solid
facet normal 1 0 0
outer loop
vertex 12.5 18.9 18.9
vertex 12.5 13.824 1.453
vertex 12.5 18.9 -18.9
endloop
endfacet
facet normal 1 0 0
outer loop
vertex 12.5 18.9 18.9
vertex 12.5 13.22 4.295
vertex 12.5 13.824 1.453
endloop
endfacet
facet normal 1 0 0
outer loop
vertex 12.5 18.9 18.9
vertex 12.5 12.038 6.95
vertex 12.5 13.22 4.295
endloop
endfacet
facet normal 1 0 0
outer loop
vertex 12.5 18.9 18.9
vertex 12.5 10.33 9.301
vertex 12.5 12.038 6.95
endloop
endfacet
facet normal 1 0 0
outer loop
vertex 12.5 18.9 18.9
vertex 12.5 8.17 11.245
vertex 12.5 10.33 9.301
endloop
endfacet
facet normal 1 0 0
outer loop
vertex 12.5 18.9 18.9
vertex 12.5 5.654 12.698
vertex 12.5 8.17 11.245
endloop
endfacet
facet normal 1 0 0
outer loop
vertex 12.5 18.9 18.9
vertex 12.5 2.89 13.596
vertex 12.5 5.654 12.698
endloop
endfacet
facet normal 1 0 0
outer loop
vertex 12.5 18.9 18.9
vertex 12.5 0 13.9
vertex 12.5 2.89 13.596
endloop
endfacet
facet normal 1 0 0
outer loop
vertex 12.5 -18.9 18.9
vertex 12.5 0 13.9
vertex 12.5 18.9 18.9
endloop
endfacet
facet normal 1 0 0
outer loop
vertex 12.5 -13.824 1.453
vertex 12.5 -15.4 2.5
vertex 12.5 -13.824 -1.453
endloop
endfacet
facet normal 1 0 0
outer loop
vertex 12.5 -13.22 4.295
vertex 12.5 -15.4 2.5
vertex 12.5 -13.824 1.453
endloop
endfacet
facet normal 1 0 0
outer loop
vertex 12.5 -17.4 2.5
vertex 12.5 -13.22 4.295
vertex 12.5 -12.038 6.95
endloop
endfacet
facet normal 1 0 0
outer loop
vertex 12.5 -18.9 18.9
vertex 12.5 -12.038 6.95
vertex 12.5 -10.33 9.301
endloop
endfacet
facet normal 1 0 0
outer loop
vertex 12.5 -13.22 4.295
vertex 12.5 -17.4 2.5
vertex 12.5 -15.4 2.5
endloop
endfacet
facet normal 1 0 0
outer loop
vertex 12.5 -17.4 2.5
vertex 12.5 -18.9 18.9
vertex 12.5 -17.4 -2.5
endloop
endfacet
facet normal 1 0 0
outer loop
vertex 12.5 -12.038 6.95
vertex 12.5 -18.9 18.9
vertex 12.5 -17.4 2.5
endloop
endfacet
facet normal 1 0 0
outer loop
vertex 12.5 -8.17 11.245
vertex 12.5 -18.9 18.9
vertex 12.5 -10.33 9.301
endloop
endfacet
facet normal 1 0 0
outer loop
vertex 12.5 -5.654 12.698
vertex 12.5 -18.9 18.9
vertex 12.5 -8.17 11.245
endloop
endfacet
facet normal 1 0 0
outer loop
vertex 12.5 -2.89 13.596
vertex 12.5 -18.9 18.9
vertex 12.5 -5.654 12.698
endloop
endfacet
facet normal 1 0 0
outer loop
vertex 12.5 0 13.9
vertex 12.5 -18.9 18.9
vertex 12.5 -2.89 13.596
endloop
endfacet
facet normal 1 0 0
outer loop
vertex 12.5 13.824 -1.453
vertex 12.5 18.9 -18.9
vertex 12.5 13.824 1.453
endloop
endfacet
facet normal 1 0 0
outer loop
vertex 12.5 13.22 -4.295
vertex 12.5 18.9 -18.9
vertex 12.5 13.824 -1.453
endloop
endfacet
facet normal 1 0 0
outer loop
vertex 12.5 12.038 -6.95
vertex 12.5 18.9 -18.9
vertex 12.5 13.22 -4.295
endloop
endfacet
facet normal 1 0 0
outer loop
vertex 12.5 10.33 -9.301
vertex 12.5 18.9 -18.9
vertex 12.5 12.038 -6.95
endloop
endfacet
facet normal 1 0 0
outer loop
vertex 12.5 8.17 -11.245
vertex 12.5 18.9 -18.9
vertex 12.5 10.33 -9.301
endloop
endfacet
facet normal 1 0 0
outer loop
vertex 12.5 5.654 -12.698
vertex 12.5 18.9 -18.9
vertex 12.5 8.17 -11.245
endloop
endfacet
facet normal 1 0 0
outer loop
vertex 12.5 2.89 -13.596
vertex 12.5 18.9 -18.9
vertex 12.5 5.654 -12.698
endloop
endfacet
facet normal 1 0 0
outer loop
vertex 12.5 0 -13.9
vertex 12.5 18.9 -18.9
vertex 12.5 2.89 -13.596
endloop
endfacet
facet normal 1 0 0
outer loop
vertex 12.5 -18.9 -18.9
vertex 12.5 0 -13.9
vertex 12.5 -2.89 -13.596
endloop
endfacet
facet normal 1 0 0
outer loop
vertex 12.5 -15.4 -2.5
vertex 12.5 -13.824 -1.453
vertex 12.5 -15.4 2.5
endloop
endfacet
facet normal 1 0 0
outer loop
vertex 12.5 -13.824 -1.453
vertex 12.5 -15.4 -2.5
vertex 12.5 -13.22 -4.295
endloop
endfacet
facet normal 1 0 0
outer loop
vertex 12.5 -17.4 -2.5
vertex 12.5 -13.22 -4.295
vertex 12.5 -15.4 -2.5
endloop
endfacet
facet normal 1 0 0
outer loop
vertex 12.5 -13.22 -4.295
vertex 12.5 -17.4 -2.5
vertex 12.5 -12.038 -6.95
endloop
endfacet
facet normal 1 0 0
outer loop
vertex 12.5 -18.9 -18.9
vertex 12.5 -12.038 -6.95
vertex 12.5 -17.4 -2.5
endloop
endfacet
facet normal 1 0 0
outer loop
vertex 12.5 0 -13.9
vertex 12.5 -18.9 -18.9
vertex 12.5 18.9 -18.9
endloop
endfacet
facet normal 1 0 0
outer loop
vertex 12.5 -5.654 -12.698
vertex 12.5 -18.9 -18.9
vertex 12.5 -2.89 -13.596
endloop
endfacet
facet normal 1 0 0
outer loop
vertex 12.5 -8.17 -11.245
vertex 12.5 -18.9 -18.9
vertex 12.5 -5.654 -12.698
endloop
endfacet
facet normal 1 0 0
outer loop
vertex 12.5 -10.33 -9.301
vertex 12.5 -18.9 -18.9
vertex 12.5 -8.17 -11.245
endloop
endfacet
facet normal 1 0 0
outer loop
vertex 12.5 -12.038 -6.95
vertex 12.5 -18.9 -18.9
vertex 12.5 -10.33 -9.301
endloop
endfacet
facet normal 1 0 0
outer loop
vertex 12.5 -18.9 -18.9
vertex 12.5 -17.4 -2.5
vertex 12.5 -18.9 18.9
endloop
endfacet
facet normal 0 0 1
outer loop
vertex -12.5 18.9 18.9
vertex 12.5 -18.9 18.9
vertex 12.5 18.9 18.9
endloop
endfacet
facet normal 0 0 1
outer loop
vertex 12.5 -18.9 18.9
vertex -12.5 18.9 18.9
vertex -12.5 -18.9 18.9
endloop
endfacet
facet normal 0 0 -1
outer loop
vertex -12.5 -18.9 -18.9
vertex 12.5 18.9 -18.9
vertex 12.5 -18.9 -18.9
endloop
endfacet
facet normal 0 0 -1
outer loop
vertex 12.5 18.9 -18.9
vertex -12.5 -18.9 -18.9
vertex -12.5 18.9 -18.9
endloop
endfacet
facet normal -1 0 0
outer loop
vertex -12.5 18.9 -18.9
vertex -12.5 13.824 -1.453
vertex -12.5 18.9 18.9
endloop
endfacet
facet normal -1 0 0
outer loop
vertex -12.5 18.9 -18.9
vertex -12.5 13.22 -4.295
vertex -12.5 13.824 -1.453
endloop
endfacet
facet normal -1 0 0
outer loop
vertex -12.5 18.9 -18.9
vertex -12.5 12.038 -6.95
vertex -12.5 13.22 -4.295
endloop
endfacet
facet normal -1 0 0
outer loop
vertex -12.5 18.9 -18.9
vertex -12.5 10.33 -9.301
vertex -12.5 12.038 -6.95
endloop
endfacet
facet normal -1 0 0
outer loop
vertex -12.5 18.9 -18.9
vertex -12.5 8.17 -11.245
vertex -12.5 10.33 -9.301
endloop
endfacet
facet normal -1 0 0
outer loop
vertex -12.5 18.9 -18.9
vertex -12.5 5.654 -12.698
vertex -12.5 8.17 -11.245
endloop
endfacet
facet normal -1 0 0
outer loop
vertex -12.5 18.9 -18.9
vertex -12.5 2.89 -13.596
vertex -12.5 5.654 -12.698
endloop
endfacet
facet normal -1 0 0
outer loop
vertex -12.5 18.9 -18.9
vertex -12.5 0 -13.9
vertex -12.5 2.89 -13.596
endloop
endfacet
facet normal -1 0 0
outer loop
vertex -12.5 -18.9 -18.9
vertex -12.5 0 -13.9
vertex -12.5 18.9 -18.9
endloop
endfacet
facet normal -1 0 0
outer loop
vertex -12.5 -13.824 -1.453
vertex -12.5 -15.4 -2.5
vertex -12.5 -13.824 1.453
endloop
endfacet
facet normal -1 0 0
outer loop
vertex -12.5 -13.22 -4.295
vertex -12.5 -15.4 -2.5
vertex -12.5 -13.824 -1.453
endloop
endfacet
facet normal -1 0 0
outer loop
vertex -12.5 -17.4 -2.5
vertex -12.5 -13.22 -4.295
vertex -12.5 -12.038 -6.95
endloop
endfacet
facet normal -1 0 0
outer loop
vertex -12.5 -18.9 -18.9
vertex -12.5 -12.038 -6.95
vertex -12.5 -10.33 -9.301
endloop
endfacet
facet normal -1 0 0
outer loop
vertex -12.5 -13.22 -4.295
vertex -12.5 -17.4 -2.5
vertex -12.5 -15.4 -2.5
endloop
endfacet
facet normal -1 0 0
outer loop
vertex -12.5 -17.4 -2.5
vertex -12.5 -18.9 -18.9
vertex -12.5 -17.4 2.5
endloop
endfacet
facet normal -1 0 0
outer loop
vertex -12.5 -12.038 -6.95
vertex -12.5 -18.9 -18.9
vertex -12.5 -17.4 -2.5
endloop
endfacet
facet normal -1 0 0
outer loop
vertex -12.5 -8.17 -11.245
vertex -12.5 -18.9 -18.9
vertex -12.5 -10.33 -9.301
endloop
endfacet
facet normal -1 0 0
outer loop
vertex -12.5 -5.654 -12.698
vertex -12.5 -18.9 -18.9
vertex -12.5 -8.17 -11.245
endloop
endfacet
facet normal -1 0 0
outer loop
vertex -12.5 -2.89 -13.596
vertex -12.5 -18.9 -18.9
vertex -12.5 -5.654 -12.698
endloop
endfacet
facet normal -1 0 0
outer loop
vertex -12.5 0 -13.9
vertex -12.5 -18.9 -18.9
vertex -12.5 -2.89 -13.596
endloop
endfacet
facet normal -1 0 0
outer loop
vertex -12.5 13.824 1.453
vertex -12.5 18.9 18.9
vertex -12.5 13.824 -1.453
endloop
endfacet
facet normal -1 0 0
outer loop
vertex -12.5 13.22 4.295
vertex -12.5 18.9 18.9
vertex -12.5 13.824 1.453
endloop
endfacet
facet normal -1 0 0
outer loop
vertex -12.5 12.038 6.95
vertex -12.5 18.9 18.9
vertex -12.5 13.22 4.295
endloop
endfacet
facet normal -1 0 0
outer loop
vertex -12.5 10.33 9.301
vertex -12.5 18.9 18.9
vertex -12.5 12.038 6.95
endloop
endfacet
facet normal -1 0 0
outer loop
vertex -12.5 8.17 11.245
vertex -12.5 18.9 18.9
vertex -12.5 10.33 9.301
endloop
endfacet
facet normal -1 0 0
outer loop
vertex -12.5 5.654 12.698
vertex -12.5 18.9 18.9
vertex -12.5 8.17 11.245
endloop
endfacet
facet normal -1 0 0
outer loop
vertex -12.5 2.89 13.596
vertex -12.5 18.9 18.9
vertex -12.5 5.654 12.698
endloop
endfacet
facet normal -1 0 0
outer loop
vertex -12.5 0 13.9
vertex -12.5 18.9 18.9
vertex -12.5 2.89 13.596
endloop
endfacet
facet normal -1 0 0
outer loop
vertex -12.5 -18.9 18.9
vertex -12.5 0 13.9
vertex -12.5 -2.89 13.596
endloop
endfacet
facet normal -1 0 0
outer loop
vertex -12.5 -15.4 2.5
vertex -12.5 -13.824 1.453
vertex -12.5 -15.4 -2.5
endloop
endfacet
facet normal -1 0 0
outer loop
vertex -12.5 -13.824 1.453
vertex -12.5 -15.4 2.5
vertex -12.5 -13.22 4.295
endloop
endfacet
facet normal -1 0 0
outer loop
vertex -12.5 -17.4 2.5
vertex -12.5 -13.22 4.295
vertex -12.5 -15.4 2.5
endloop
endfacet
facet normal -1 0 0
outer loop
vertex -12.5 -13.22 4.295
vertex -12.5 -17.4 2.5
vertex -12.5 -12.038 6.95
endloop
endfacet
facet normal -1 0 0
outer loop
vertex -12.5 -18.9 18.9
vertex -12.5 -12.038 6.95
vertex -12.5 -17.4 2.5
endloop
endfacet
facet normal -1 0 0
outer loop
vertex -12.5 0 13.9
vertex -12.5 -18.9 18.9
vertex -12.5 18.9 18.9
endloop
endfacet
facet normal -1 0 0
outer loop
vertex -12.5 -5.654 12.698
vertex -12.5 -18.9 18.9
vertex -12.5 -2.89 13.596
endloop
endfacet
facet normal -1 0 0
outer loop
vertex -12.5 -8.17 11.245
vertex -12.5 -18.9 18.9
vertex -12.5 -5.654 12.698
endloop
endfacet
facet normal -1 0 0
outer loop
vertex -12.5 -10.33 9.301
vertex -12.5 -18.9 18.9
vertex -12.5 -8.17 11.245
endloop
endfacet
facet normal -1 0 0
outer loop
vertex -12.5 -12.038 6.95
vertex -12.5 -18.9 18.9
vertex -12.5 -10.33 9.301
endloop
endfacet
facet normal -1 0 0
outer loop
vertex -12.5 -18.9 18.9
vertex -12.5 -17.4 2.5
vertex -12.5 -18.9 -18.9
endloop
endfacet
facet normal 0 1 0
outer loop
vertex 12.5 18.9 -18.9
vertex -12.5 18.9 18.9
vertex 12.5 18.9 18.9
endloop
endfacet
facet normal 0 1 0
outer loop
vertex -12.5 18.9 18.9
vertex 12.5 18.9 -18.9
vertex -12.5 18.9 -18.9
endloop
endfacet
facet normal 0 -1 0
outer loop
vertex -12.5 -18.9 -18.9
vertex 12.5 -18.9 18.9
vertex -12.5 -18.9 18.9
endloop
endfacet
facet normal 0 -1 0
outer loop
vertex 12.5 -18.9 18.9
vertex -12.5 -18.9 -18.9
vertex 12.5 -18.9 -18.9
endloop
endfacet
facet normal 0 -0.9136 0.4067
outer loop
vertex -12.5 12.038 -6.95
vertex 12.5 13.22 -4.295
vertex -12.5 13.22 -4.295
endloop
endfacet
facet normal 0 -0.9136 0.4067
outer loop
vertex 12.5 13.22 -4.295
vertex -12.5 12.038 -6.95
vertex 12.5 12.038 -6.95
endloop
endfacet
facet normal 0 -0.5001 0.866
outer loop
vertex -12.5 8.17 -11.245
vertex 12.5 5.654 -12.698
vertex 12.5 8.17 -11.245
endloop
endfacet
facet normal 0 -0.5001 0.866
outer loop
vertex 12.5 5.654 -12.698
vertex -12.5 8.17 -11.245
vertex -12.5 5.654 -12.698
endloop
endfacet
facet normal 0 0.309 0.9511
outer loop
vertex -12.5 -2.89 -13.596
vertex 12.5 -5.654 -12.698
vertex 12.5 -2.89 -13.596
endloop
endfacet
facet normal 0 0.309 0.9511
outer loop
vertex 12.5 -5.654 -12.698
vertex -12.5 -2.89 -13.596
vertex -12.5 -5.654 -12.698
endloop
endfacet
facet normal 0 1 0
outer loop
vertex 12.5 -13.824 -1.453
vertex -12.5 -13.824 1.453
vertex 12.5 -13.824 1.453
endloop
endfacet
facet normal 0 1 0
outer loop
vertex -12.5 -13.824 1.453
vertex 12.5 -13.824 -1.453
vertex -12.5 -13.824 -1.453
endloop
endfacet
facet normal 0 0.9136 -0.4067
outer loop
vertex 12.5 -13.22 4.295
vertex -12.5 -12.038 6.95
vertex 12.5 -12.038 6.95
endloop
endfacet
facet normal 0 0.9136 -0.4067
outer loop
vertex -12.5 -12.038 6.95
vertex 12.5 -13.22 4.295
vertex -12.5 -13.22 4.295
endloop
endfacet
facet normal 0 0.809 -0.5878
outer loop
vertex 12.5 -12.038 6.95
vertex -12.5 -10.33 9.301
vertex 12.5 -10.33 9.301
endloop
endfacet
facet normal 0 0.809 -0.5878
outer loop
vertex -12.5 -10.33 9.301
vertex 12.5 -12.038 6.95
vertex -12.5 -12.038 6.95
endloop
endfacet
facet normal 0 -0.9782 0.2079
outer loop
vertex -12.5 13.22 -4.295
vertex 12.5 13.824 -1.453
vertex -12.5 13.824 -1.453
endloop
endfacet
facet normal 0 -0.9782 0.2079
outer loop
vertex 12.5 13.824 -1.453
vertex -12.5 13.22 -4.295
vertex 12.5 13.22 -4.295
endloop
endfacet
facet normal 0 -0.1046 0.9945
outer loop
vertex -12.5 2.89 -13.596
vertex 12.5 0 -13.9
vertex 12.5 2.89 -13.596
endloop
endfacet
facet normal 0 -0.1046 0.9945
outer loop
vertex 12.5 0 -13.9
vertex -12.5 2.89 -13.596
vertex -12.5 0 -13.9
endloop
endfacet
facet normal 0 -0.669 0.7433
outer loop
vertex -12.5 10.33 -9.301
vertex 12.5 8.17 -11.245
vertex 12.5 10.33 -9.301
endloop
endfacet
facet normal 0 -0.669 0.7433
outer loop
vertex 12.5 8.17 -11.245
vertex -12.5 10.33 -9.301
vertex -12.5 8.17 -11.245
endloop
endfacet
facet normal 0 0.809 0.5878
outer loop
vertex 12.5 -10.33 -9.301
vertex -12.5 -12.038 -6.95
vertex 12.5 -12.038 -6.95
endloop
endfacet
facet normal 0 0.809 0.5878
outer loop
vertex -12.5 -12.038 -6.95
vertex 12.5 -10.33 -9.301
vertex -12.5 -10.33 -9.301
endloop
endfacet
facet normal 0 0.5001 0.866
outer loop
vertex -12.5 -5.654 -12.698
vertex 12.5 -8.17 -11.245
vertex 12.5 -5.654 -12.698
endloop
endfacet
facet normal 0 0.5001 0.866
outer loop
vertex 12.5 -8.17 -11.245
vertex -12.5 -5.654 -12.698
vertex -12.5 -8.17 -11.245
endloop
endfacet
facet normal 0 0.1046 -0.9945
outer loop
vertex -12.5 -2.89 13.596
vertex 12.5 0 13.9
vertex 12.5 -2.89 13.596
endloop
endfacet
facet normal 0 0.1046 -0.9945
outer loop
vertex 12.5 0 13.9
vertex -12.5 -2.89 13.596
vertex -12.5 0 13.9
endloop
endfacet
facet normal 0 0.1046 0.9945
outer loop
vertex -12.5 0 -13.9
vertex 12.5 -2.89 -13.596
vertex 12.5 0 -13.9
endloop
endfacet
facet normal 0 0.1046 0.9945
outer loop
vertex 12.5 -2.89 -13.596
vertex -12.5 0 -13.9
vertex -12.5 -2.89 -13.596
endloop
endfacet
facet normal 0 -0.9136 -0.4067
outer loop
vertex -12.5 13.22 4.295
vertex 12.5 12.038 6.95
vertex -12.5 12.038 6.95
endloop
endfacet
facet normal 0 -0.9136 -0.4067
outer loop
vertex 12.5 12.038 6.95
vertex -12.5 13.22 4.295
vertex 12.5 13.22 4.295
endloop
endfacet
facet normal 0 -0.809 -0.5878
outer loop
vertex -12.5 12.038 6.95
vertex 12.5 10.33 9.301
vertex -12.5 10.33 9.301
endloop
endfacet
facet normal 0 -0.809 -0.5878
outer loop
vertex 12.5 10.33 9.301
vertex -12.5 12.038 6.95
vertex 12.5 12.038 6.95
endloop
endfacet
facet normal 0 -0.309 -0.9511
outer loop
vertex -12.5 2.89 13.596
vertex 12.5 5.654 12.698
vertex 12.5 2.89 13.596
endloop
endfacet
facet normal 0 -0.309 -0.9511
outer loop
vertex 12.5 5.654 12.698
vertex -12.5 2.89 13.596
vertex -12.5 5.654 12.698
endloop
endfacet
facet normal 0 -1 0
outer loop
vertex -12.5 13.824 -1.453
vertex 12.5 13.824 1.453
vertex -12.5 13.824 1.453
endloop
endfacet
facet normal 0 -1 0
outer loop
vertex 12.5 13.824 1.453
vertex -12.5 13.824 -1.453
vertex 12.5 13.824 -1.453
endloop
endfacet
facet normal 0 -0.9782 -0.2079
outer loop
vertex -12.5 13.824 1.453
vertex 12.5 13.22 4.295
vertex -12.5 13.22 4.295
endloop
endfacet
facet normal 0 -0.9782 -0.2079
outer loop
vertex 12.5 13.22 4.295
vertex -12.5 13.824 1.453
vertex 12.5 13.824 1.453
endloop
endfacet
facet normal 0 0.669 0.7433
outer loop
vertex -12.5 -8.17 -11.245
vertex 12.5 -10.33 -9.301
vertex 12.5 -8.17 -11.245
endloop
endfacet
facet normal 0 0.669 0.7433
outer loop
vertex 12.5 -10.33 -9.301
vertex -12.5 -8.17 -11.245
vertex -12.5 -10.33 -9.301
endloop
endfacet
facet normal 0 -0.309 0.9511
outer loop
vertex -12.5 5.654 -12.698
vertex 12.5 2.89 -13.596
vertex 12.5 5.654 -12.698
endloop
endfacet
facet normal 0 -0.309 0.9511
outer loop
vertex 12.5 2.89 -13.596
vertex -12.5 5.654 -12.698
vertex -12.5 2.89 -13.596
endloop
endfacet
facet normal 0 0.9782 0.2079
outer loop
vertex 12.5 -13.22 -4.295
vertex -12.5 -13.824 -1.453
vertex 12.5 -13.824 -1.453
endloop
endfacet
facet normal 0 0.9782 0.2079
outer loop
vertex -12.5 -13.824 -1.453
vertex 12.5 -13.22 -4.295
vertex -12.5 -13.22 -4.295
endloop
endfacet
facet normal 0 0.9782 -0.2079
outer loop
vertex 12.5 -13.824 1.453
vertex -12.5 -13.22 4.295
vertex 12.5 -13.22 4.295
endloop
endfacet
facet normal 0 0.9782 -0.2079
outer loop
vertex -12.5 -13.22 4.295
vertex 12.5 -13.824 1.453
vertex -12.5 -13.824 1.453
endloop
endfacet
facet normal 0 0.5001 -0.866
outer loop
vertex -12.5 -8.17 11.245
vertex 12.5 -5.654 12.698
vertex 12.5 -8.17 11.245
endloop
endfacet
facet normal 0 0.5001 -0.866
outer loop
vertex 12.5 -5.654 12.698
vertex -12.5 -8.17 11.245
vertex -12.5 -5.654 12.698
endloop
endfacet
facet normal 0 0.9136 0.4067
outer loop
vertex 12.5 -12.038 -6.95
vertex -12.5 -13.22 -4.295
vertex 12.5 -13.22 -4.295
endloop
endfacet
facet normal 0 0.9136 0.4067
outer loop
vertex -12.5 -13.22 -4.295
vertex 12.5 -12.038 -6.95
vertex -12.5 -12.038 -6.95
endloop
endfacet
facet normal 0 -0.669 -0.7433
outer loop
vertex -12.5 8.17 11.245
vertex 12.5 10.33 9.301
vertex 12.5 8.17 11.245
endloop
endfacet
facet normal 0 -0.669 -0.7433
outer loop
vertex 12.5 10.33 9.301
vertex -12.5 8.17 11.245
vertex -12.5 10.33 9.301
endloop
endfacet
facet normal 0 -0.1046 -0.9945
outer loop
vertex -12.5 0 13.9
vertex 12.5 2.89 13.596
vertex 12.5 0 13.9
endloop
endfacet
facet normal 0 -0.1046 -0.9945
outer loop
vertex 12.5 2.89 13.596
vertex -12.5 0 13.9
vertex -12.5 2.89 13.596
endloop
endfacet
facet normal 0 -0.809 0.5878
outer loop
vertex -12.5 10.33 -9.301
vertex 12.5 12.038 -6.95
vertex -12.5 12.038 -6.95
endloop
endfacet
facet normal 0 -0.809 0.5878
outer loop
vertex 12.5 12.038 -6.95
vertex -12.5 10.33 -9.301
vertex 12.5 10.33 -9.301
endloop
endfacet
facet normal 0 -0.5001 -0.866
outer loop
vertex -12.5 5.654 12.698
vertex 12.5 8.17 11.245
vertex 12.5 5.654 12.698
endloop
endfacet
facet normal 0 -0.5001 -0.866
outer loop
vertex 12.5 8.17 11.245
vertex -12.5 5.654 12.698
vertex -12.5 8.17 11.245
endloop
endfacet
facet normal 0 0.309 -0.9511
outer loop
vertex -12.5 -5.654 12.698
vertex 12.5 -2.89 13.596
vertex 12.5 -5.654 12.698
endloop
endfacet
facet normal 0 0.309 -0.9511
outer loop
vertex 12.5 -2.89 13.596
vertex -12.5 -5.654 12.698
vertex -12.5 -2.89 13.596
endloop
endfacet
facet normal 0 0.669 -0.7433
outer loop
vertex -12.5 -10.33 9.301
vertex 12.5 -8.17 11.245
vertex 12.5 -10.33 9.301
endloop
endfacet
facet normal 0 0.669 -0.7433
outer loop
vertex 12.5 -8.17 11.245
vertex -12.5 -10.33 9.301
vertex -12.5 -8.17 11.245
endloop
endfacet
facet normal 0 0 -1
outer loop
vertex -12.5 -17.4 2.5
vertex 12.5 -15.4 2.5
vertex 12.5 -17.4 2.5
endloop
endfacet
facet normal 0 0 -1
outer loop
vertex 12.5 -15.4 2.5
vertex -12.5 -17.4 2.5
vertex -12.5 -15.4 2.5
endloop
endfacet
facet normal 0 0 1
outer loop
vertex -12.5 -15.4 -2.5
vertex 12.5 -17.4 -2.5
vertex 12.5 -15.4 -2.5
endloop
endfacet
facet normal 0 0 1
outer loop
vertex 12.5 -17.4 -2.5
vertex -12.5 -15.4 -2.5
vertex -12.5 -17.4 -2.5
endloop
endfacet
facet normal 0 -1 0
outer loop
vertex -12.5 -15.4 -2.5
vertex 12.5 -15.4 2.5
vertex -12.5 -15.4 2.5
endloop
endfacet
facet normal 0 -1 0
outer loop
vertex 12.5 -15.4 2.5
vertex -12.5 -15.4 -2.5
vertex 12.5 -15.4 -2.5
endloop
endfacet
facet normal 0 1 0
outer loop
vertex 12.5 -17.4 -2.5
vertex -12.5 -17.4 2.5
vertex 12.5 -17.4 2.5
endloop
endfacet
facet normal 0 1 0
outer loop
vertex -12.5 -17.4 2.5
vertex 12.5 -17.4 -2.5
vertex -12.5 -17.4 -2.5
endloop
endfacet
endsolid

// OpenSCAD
legwidth=25.2;
legdepth=15;
mountlegpad=5;
mountnarrow=25;


difference(){
    buttondiam=27.8;
    pad=5;
    ziptiewidth=5;
    ziptieheight=2;

    cube ([mountnarrow, buttondiam + 2*pad
        , buttondiam + 2*pad], center=true);
    rotate([0,90,0])
        cylinder(mountnarrow, d=buttondiam, center=true);
    translate([0, -buttondiam/2 - pad/2, 0])
    cube ([mountnarrow, ziptieheight, ziptiewidth],center=true);
}
